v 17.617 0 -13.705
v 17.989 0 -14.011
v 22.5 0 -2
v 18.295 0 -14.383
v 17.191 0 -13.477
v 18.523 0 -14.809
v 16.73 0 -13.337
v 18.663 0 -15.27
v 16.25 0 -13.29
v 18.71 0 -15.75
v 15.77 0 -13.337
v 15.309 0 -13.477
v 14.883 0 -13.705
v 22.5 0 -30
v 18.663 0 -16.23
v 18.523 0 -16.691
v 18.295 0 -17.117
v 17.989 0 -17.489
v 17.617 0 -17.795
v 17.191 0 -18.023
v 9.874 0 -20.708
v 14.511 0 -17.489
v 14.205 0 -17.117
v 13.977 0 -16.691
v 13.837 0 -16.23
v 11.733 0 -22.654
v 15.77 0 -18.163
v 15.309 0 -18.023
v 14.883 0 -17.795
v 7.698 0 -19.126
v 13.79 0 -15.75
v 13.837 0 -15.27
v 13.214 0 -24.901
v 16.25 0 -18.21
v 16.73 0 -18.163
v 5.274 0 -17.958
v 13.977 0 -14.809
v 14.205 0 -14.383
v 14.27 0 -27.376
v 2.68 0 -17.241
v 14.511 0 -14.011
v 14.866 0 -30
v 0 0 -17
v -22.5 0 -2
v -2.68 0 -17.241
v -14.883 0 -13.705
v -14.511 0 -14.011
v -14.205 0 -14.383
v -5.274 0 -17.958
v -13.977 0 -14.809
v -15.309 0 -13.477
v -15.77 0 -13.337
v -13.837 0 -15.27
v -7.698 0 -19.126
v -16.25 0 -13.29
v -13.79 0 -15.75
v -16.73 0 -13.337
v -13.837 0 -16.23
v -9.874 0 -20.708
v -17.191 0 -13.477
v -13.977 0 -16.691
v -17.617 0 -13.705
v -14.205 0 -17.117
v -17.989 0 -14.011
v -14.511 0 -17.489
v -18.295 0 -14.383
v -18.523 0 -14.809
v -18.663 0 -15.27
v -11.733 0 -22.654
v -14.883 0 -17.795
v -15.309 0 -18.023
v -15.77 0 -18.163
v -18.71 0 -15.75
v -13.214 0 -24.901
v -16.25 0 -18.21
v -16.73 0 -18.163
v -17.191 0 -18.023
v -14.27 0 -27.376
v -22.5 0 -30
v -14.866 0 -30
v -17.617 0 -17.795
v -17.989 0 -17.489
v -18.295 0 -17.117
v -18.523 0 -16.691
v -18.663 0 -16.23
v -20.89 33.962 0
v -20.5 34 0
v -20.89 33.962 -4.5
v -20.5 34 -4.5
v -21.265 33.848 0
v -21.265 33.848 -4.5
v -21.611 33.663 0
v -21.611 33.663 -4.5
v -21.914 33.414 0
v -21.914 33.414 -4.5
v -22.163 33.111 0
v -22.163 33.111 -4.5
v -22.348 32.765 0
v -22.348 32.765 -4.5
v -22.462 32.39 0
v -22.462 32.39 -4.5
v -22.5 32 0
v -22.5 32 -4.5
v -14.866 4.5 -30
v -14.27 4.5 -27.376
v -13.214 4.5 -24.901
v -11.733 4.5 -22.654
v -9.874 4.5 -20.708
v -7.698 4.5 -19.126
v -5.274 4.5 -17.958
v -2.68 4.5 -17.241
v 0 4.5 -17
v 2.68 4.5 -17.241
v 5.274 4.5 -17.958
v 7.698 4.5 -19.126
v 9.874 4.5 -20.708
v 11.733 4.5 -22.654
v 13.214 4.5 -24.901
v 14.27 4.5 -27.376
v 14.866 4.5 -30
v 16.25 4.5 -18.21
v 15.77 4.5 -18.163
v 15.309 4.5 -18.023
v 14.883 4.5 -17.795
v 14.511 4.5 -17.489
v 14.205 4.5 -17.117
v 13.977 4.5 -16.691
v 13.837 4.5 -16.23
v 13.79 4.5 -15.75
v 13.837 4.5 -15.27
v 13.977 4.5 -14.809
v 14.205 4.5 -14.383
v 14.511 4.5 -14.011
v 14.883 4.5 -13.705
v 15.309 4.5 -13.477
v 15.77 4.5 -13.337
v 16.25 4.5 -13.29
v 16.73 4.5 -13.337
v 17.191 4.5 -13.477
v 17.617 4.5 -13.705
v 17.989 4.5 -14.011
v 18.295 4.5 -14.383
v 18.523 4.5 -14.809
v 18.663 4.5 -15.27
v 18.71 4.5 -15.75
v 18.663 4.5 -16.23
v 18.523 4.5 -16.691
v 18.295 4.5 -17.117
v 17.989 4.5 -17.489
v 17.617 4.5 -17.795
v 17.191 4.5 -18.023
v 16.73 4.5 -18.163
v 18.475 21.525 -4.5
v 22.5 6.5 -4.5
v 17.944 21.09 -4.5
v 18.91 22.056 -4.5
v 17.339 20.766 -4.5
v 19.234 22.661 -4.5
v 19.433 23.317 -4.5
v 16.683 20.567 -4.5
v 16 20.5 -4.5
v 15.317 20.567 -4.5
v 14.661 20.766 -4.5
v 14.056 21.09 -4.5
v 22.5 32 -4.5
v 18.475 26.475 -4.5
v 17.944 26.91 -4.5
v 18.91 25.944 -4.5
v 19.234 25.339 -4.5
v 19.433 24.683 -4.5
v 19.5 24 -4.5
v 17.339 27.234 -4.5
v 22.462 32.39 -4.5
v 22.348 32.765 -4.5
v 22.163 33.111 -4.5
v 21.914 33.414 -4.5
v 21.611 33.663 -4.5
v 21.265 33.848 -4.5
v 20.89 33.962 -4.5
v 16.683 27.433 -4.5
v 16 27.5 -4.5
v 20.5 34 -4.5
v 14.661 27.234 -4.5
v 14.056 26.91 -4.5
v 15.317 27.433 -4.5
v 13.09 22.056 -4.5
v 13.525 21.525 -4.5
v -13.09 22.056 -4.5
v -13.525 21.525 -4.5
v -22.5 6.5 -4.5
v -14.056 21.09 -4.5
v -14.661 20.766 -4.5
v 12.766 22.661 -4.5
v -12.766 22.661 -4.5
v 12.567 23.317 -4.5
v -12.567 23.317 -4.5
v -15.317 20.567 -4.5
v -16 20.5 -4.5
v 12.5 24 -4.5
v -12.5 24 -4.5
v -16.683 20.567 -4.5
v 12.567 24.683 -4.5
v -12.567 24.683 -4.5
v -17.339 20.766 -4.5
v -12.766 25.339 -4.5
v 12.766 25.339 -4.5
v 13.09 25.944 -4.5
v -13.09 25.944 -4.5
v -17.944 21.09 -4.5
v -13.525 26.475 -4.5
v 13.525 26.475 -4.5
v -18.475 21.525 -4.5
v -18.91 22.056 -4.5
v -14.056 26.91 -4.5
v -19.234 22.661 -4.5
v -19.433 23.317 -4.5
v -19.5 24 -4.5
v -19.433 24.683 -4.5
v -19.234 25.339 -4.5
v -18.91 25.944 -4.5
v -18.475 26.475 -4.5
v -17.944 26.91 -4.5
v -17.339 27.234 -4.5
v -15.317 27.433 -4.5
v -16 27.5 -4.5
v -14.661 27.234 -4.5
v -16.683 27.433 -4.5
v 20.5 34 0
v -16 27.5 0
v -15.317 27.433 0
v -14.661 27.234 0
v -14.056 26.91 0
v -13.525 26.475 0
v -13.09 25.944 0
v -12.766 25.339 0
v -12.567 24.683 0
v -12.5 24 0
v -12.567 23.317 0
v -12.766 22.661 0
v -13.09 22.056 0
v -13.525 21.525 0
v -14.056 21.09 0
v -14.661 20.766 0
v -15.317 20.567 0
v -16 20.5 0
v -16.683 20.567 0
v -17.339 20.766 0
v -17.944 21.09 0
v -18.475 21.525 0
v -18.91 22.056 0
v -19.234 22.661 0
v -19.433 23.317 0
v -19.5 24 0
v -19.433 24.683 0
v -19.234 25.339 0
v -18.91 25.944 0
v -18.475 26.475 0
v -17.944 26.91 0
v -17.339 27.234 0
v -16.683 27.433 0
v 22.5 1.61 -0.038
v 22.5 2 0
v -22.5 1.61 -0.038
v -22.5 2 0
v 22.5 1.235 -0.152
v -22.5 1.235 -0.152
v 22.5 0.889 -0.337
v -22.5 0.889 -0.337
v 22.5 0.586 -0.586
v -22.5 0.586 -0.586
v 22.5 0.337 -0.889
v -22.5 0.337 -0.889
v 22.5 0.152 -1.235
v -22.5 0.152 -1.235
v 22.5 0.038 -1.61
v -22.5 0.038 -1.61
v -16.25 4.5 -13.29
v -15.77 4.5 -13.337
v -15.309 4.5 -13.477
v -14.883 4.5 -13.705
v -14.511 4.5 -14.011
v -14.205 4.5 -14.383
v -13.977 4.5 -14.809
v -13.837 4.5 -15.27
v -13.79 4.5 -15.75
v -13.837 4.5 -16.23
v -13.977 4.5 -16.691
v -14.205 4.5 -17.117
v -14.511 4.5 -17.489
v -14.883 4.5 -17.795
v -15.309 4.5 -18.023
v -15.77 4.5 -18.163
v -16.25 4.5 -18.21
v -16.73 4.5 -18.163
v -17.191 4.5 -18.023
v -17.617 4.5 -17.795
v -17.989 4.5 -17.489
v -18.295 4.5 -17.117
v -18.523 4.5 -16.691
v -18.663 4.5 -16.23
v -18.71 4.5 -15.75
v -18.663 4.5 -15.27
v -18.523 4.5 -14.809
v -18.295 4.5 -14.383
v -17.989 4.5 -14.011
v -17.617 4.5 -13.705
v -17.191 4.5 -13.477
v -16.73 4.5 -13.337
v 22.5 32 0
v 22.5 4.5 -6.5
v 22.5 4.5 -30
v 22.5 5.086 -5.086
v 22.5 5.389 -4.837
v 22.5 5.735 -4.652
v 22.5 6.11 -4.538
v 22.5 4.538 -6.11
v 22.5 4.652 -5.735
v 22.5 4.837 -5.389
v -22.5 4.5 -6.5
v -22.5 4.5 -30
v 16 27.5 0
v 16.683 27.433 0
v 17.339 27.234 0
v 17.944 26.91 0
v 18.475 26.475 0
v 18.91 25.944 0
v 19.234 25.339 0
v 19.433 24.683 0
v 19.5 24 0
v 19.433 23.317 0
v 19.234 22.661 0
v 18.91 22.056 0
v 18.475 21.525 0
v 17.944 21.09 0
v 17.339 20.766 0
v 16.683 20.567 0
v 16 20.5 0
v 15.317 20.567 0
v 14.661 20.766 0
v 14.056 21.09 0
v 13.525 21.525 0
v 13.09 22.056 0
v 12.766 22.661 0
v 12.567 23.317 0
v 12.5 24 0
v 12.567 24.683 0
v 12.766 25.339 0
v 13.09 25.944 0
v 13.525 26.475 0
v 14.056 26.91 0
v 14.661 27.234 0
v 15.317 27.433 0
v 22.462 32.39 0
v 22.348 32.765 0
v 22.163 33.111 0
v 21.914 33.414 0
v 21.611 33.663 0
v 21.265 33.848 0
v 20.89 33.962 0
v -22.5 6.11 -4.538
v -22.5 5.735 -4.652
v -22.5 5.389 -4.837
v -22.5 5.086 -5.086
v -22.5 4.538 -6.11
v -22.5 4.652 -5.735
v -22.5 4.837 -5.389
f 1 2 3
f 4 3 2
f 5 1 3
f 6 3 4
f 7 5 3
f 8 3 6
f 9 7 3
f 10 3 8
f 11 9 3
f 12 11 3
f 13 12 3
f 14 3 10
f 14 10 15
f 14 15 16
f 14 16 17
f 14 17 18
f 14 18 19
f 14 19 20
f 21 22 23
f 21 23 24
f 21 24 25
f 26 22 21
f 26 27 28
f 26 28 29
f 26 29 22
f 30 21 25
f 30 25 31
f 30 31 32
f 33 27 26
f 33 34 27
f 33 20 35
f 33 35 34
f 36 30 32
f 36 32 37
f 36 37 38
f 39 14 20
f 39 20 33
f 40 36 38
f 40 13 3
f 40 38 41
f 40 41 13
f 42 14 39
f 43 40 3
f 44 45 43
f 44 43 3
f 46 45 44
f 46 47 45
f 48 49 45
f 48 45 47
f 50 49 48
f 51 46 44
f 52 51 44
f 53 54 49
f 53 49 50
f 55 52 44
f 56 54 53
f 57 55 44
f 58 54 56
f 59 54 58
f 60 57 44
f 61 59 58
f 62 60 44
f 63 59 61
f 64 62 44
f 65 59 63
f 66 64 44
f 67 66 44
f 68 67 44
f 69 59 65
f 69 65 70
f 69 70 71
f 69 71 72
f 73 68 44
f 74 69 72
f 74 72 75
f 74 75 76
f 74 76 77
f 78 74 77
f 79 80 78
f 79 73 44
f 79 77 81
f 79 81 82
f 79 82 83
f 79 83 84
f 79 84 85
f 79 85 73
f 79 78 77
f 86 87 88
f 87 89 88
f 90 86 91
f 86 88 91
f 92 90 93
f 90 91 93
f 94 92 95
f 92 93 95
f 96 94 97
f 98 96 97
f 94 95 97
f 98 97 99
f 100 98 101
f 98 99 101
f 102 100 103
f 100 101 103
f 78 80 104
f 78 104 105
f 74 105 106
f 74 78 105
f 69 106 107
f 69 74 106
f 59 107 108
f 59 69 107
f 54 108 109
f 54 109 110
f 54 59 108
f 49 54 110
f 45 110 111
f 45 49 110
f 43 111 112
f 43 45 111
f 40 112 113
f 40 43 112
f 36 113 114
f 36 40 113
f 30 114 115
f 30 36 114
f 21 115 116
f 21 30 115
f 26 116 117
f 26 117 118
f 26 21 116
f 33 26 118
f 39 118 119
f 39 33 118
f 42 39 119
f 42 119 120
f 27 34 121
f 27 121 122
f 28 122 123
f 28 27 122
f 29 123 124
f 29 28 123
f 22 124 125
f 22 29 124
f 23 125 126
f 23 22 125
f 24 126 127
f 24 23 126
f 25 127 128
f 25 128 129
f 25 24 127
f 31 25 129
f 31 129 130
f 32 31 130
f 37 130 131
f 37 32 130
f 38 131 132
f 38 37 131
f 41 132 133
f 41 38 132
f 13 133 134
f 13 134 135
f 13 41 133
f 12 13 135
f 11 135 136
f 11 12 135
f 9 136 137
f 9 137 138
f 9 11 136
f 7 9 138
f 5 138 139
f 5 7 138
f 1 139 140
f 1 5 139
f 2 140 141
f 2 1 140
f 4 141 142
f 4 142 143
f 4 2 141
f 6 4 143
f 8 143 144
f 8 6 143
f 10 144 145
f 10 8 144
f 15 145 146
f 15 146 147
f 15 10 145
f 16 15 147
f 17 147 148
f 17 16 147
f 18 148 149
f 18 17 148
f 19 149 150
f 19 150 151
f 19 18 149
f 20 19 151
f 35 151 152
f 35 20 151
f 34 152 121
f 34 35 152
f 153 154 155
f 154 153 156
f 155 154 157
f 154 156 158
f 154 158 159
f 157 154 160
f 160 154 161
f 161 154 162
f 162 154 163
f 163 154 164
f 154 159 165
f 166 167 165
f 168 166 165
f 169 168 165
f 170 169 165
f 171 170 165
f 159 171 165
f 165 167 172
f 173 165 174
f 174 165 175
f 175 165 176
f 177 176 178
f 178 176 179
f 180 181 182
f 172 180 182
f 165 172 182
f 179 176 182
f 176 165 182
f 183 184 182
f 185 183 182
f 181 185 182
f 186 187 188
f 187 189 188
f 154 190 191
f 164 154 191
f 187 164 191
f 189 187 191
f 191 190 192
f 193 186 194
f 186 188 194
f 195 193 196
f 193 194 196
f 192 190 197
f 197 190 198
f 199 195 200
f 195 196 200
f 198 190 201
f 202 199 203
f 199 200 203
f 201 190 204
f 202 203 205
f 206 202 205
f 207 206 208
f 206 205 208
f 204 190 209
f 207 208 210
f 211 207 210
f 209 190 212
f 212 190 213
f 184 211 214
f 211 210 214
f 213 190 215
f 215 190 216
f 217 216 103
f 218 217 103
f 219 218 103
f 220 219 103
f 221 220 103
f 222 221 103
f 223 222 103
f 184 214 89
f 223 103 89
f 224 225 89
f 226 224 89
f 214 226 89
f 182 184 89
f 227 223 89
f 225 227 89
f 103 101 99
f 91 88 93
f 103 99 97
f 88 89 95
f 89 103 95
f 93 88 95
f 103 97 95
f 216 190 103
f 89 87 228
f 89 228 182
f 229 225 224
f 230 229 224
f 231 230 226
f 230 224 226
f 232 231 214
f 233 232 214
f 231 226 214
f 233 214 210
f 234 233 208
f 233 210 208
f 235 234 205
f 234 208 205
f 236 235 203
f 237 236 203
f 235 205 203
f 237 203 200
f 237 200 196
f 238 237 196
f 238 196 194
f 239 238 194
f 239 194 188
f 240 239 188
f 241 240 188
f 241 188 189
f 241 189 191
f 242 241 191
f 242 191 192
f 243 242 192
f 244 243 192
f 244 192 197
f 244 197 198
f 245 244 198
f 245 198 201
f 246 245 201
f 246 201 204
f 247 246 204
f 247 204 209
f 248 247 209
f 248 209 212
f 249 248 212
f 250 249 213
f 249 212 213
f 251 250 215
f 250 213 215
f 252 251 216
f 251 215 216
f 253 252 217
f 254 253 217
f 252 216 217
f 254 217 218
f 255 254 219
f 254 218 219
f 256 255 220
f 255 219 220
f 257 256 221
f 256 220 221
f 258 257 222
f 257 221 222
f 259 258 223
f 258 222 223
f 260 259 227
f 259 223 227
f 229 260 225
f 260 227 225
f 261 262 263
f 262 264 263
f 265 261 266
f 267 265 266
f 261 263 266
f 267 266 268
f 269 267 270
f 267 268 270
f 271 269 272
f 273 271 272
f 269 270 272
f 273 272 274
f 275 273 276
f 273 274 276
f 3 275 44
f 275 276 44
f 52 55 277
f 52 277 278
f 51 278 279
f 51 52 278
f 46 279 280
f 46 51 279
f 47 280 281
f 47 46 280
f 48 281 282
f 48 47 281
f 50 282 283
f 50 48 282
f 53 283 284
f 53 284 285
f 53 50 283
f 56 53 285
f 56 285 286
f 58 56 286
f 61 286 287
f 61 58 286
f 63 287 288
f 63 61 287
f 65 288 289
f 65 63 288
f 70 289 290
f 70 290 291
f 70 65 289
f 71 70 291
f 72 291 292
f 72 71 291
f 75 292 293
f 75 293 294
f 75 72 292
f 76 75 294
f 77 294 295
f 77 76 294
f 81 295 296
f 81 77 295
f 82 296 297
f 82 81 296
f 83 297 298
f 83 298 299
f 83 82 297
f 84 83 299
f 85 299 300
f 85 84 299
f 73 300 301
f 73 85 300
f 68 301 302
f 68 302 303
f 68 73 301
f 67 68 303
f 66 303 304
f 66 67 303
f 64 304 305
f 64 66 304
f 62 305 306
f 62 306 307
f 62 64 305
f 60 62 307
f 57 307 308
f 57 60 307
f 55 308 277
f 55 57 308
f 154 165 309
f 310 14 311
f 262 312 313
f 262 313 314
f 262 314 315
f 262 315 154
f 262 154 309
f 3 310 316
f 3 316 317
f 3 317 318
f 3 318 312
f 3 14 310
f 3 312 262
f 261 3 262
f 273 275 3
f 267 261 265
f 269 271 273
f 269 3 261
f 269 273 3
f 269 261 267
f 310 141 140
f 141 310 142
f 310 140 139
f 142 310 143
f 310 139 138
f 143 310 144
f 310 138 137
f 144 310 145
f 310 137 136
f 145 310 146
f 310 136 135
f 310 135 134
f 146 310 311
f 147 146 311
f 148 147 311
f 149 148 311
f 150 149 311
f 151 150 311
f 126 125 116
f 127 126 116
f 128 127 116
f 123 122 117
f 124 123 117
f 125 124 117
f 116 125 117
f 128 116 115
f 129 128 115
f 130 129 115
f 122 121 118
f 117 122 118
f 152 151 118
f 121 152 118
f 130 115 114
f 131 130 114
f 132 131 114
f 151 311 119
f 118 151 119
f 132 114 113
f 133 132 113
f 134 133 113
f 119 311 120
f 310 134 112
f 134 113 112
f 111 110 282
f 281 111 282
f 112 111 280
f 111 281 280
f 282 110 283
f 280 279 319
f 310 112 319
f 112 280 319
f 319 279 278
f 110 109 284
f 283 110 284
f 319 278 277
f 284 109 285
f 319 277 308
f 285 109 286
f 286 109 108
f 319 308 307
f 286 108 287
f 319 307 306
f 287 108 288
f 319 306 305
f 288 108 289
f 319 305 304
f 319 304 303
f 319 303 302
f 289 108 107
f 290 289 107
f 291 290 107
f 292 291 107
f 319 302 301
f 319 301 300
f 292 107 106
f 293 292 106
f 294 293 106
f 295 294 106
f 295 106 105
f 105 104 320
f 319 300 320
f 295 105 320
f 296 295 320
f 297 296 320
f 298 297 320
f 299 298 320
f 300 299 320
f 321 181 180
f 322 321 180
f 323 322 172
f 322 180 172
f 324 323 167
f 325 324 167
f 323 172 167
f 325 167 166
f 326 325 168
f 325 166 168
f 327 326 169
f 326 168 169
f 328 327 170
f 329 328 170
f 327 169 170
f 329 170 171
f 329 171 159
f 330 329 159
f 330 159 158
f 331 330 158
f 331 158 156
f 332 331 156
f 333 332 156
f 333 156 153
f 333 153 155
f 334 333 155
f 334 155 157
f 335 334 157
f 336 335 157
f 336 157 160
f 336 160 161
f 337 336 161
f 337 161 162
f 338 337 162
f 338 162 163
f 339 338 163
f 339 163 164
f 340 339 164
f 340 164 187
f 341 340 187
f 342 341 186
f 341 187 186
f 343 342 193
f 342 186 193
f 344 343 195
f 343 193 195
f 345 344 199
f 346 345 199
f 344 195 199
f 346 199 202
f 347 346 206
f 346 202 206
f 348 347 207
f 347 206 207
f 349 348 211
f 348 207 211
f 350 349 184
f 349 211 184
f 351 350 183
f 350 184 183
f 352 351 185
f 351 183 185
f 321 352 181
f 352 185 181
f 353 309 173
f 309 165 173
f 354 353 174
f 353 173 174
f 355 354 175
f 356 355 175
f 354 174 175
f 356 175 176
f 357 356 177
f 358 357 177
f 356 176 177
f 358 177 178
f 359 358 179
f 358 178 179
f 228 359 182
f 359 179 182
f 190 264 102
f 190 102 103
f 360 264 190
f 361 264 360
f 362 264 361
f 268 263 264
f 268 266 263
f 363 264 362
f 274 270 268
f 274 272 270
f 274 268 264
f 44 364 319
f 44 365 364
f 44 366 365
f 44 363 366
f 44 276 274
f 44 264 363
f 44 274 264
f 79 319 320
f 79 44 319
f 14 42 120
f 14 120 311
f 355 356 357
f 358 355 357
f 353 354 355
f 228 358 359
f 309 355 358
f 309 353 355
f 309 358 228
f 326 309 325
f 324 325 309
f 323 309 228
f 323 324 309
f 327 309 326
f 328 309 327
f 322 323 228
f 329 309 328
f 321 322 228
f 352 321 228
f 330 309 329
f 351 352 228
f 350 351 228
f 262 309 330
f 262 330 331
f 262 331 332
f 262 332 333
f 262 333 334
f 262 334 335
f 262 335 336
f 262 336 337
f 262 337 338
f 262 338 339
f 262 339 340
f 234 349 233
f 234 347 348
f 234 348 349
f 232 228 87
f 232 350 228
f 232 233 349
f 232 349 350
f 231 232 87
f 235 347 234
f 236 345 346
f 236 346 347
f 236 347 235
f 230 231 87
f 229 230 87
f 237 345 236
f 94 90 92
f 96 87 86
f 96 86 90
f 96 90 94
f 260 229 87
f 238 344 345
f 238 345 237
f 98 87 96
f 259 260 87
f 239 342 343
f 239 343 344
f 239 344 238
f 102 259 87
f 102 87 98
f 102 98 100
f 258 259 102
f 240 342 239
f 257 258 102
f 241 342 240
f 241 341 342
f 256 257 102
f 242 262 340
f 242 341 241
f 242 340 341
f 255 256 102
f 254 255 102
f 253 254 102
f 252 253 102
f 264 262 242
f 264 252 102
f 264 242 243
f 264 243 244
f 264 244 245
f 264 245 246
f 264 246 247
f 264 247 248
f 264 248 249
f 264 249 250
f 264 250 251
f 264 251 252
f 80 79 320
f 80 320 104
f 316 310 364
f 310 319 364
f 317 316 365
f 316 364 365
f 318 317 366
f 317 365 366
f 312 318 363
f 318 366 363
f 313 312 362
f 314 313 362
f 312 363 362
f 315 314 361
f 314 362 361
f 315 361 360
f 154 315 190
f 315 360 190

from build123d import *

# Parameters (mm, degrees)
CROQUIS1_R                   = 2.46
SALIENTE_EXTRUIR1_DEPTH      = 4.5
SALIENTE_EXTRUIR2_DEPTH      = 22.5
SALIENTE_EXTRUIR2_DEPTH_BACK = 22.5
CROQUIS2_W                   = 4.5
CROQUIS2_H                   = 34
CROQUIS3_R                   = 3.5
CORTAR_EXTRUIR1_DEPTH        = 22.5
REDONDEO1_R                  = 2
REDONDEO2_R                  = 2
REDONDEO3_R                  = 2


with BuildPart() as part:
    # Croquis1 → Saliente-Extruir1 (new body)
    with BuildSketch(Plane(origin=(0, 0, 0), x_dir=(1, 0, 0), z_dir=(0, 1, 0))):
        with BuildLine():
            Line((22.5, 0), (-22.5, 0))
            Line((-22.5, 0), (-22.5, 30))
            Line((-22.5, 30), (-14.866068747, 30))
            ThreePointArc((-14.866068747, 30), (0, 17), (14.866068747, 30))
            Line((14.866068747, 30), (22.5, 30))
            Line((22.5, 30), (22.5, 0))
        make_face()
        with Locations((-16.25, 15.75)):
            Circle(CROQUIS1_R, mode=Mode.SUBTRACT)
        with Locations((16.25, 15.75)):
            Circle(CROQUIS1_R, mode=Mode.SUBTRACT)
    extrude(amount=SALIENTE_EXTRUIR1_DEPTH)

    # Croquis2 → Saliente-Extruir2 (add, two sides: drawn at the far end of the back side and taken through both)
    with BuildSketch(Plane(origin=(0, 0, 0), x_dir=(0, 0, -1), z_dir=(1, 0, 0)).offset(-SALIENTE_EXTRUIR2_DEPTH_BACK)):
        with Locations((2.25, 17)):
            Rectangle(CROQUIS2_W, CROQUIS2_H)
    extrude(amount=SALIENTE_EXTRUIR2_DEPTH + SALIENTE_EXTRUIR2_DEPTH_BACK)

    # Croquis3 → Cortar-Extruir1 (cut)
    with BuildSketch(Plane(origin=(0, 0, -4.5), x_dir=(-1, 0, 0), z_dir=(0, 0, -1))):
        with Locations((-16, 24)):
            Circle(CROQUIS3_R)
        with Locations((16, 24)):
            Circle(CROQUIS3_R)
    extrude(amount=-CORTAR_EXTRUIR1_DEPTH, mode=Mode.SUBTRACT)

    # Redondeo1
    redondeo1_edges = [part.edges().sort_by_distance(p)[0] for p in [
        (0, 0, 0),
    ]]
    fillet(redondeo1_edges, radius=REDONDEO1_R)

    # Redondeo2
    redondeo2_edges = [part.edges().sort_by_distance(p)[0] for p in [
        (0, 4.5, -4.5),
    ]]
    fillet(redondeo2_edges, radius=REDONDEO2_R)

    # Redondeo3
    redondeo3_edges = [part.edges().sort_by_distance(p)[0] for p in [
        (22.5, 34, -2.25),
        (-22.5, 34, -2.25),
    ]]
    fillet(redondeo3_edges, radius=REDONDEO3_R)


solid = part.part
